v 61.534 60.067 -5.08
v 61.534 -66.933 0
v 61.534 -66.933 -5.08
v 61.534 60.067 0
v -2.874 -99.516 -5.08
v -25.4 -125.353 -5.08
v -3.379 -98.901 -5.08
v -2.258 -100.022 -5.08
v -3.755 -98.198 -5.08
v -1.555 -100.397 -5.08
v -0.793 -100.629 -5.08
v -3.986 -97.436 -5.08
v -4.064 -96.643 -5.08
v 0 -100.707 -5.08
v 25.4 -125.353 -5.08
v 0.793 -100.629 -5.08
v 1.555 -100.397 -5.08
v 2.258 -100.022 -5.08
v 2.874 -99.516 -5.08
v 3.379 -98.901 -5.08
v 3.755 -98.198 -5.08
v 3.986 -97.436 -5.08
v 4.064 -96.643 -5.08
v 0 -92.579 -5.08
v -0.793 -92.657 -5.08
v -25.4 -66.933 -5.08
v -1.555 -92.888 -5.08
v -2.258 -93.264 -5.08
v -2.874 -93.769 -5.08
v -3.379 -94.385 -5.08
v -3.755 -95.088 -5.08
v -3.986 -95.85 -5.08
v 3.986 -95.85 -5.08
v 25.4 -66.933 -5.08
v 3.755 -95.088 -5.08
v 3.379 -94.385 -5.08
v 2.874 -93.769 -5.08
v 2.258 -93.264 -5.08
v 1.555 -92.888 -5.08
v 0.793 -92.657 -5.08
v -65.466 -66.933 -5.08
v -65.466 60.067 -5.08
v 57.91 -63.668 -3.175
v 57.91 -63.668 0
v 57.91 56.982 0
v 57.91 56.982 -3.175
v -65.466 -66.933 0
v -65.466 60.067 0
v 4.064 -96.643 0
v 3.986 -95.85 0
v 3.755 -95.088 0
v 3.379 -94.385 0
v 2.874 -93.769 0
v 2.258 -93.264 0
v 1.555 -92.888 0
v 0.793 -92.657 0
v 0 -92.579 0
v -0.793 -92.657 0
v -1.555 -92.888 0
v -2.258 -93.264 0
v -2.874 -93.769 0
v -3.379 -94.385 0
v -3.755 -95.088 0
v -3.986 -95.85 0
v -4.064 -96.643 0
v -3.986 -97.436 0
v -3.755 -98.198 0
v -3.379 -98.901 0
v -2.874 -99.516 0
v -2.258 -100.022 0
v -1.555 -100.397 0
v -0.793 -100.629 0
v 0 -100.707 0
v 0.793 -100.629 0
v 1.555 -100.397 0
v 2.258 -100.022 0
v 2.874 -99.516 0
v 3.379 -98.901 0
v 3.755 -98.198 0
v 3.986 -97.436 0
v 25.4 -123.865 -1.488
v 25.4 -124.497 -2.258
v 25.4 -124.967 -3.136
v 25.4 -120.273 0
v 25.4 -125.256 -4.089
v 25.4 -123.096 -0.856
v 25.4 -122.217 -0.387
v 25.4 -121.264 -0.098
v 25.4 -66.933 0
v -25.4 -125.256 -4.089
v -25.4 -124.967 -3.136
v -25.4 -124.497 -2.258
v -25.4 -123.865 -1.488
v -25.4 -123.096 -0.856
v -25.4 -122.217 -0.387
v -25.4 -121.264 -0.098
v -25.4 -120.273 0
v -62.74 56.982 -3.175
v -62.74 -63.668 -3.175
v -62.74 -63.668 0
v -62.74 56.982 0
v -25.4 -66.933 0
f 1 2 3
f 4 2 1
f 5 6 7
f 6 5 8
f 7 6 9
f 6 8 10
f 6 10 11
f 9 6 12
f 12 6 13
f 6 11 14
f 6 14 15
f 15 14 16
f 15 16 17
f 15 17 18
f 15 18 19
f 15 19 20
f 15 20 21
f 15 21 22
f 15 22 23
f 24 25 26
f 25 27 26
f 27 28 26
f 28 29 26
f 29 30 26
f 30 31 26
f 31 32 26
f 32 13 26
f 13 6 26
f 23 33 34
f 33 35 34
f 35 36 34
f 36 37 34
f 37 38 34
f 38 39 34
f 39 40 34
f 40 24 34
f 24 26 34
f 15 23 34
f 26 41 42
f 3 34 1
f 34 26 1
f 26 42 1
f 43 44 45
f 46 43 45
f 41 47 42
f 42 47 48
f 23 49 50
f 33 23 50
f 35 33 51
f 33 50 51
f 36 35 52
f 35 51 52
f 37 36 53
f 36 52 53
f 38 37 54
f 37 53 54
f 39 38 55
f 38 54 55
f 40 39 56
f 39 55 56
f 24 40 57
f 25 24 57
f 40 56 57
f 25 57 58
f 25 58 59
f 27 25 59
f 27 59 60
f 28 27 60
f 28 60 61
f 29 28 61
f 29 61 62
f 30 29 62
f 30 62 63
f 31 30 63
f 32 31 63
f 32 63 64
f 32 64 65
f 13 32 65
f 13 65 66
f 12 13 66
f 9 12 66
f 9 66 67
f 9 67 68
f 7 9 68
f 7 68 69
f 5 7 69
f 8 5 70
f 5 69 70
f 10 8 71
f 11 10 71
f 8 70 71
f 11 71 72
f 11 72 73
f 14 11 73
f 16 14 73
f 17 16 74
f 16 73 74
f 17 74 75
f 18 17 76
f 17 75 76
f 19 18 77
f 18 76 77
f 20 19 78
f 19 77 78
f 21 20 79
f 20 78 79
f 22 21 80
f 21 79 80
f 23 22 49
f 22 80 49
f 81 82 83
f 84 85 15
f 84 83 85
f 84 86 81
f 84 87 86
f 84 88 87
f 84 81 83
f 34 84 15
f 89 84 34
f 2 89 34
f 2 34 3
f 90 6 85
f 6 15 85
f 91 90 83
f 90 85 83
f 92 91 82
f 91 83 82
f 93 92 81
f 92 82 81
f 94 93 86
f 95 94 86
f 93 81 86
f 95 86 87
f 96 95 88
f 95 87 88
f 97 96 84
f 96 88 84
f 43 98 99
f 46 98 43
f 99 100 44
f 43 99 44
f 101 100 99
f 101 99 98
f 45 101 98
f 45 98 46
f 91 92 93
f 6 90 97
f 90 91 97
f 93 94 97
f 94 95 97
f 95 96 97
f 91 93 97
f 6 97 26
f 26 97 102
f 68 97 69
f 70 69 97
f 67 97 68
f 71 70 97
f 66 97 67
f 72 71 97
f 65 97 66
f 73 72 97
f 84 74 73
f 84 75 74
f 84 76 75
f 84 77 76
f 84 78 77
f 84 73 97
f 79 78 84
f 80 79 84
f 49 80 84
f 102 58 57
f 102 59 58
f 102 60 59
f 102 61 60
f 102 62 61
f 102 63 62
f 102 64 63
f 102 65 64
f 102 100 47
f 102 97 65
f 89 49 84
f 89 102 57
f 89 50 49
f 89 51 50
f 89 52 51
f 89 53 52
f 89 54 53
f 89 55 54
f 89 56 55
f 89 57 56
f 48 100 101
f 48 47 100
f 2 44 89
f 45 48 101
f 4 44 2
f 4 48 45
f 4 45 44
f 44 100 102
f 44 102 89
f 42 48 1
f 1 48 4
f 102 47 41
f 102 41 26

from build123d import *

# Parameters (mm, degrees)
F0_W      = 127
F0_H      = 127
F2_DEPTH  = 5.08
F3_W      = 50.8
F3_H      = 58.42
F4_DEPTH  = 5.08
F5_W      = 50.8
F5_H      = 12.7
F6_DEPTH  = 2.54
F7_R      = 5.07999
F9_W      = 120.65
F9_H      = 120.65
F10_DEPTH = 3.175
F11_R     = 4.064
F12_DEPTH = 25.4


# Not quite as in the source:
# - a fillet or chamfer is up to 0.001 mm smaller than in the source, because OpenCascade refuses the exact size


with BuildPart() as f2:
    # F0 (on Top) → F2 (new body)
    with BuildSketch(Plane.XY):
        with Locations((-1.9660266274, -3.4333672374)):
            Rectangle(F0_W, F0_H)
    extrude(amount=-F2_DEPTH)

    # F3 (on face) → F4 (join)
    with BuildSketch(Plane.XY):
        with Locations((0, -96.1433672374)):
            Rectangle(F3_W, F3_H)
    extrude(amount=-F4_DEPTH)

    # F5 (on face) → F6 (cut)
    with BuildSketch(Plane.XZ.offset(125.3533672374)):
        with Locations((0, -11.43)):
            Rectangle(F5_W, F5_H)
    extrude(amount=-F6_DEPTH, mode=Mode.SUBTRACT)

    # F7 (radius 5.08 in the source; OpenCascade refuses exactly that, so slightly less here)
    f7_edges = [f2.edges().sort_by_distance(p)[0] for p in [
        (0, -125.353367, 0),
    ]]
    fillet(f7_edges, radius=F7_R)

    # F9 (on Top) → F10 (cut)
    with BuildSketch(Plane.XY):
        with Locations((-2.4150442332, -3.342743357)):
            Rectangle(F9_W, F9_H)
    extrude(amount=-F10_DEPTH, mode=Mode.SUBTRACT)

    # F11 (on face) → F12 (cut)
    with BuildSketch(Plane.XY):
        with Locations((0, -96.6428003655)):
            Circle(F11_R)
    extrude(amount=-F12_DEPTH, mode=Mode.SUBTRACT)


solid = f2.part
